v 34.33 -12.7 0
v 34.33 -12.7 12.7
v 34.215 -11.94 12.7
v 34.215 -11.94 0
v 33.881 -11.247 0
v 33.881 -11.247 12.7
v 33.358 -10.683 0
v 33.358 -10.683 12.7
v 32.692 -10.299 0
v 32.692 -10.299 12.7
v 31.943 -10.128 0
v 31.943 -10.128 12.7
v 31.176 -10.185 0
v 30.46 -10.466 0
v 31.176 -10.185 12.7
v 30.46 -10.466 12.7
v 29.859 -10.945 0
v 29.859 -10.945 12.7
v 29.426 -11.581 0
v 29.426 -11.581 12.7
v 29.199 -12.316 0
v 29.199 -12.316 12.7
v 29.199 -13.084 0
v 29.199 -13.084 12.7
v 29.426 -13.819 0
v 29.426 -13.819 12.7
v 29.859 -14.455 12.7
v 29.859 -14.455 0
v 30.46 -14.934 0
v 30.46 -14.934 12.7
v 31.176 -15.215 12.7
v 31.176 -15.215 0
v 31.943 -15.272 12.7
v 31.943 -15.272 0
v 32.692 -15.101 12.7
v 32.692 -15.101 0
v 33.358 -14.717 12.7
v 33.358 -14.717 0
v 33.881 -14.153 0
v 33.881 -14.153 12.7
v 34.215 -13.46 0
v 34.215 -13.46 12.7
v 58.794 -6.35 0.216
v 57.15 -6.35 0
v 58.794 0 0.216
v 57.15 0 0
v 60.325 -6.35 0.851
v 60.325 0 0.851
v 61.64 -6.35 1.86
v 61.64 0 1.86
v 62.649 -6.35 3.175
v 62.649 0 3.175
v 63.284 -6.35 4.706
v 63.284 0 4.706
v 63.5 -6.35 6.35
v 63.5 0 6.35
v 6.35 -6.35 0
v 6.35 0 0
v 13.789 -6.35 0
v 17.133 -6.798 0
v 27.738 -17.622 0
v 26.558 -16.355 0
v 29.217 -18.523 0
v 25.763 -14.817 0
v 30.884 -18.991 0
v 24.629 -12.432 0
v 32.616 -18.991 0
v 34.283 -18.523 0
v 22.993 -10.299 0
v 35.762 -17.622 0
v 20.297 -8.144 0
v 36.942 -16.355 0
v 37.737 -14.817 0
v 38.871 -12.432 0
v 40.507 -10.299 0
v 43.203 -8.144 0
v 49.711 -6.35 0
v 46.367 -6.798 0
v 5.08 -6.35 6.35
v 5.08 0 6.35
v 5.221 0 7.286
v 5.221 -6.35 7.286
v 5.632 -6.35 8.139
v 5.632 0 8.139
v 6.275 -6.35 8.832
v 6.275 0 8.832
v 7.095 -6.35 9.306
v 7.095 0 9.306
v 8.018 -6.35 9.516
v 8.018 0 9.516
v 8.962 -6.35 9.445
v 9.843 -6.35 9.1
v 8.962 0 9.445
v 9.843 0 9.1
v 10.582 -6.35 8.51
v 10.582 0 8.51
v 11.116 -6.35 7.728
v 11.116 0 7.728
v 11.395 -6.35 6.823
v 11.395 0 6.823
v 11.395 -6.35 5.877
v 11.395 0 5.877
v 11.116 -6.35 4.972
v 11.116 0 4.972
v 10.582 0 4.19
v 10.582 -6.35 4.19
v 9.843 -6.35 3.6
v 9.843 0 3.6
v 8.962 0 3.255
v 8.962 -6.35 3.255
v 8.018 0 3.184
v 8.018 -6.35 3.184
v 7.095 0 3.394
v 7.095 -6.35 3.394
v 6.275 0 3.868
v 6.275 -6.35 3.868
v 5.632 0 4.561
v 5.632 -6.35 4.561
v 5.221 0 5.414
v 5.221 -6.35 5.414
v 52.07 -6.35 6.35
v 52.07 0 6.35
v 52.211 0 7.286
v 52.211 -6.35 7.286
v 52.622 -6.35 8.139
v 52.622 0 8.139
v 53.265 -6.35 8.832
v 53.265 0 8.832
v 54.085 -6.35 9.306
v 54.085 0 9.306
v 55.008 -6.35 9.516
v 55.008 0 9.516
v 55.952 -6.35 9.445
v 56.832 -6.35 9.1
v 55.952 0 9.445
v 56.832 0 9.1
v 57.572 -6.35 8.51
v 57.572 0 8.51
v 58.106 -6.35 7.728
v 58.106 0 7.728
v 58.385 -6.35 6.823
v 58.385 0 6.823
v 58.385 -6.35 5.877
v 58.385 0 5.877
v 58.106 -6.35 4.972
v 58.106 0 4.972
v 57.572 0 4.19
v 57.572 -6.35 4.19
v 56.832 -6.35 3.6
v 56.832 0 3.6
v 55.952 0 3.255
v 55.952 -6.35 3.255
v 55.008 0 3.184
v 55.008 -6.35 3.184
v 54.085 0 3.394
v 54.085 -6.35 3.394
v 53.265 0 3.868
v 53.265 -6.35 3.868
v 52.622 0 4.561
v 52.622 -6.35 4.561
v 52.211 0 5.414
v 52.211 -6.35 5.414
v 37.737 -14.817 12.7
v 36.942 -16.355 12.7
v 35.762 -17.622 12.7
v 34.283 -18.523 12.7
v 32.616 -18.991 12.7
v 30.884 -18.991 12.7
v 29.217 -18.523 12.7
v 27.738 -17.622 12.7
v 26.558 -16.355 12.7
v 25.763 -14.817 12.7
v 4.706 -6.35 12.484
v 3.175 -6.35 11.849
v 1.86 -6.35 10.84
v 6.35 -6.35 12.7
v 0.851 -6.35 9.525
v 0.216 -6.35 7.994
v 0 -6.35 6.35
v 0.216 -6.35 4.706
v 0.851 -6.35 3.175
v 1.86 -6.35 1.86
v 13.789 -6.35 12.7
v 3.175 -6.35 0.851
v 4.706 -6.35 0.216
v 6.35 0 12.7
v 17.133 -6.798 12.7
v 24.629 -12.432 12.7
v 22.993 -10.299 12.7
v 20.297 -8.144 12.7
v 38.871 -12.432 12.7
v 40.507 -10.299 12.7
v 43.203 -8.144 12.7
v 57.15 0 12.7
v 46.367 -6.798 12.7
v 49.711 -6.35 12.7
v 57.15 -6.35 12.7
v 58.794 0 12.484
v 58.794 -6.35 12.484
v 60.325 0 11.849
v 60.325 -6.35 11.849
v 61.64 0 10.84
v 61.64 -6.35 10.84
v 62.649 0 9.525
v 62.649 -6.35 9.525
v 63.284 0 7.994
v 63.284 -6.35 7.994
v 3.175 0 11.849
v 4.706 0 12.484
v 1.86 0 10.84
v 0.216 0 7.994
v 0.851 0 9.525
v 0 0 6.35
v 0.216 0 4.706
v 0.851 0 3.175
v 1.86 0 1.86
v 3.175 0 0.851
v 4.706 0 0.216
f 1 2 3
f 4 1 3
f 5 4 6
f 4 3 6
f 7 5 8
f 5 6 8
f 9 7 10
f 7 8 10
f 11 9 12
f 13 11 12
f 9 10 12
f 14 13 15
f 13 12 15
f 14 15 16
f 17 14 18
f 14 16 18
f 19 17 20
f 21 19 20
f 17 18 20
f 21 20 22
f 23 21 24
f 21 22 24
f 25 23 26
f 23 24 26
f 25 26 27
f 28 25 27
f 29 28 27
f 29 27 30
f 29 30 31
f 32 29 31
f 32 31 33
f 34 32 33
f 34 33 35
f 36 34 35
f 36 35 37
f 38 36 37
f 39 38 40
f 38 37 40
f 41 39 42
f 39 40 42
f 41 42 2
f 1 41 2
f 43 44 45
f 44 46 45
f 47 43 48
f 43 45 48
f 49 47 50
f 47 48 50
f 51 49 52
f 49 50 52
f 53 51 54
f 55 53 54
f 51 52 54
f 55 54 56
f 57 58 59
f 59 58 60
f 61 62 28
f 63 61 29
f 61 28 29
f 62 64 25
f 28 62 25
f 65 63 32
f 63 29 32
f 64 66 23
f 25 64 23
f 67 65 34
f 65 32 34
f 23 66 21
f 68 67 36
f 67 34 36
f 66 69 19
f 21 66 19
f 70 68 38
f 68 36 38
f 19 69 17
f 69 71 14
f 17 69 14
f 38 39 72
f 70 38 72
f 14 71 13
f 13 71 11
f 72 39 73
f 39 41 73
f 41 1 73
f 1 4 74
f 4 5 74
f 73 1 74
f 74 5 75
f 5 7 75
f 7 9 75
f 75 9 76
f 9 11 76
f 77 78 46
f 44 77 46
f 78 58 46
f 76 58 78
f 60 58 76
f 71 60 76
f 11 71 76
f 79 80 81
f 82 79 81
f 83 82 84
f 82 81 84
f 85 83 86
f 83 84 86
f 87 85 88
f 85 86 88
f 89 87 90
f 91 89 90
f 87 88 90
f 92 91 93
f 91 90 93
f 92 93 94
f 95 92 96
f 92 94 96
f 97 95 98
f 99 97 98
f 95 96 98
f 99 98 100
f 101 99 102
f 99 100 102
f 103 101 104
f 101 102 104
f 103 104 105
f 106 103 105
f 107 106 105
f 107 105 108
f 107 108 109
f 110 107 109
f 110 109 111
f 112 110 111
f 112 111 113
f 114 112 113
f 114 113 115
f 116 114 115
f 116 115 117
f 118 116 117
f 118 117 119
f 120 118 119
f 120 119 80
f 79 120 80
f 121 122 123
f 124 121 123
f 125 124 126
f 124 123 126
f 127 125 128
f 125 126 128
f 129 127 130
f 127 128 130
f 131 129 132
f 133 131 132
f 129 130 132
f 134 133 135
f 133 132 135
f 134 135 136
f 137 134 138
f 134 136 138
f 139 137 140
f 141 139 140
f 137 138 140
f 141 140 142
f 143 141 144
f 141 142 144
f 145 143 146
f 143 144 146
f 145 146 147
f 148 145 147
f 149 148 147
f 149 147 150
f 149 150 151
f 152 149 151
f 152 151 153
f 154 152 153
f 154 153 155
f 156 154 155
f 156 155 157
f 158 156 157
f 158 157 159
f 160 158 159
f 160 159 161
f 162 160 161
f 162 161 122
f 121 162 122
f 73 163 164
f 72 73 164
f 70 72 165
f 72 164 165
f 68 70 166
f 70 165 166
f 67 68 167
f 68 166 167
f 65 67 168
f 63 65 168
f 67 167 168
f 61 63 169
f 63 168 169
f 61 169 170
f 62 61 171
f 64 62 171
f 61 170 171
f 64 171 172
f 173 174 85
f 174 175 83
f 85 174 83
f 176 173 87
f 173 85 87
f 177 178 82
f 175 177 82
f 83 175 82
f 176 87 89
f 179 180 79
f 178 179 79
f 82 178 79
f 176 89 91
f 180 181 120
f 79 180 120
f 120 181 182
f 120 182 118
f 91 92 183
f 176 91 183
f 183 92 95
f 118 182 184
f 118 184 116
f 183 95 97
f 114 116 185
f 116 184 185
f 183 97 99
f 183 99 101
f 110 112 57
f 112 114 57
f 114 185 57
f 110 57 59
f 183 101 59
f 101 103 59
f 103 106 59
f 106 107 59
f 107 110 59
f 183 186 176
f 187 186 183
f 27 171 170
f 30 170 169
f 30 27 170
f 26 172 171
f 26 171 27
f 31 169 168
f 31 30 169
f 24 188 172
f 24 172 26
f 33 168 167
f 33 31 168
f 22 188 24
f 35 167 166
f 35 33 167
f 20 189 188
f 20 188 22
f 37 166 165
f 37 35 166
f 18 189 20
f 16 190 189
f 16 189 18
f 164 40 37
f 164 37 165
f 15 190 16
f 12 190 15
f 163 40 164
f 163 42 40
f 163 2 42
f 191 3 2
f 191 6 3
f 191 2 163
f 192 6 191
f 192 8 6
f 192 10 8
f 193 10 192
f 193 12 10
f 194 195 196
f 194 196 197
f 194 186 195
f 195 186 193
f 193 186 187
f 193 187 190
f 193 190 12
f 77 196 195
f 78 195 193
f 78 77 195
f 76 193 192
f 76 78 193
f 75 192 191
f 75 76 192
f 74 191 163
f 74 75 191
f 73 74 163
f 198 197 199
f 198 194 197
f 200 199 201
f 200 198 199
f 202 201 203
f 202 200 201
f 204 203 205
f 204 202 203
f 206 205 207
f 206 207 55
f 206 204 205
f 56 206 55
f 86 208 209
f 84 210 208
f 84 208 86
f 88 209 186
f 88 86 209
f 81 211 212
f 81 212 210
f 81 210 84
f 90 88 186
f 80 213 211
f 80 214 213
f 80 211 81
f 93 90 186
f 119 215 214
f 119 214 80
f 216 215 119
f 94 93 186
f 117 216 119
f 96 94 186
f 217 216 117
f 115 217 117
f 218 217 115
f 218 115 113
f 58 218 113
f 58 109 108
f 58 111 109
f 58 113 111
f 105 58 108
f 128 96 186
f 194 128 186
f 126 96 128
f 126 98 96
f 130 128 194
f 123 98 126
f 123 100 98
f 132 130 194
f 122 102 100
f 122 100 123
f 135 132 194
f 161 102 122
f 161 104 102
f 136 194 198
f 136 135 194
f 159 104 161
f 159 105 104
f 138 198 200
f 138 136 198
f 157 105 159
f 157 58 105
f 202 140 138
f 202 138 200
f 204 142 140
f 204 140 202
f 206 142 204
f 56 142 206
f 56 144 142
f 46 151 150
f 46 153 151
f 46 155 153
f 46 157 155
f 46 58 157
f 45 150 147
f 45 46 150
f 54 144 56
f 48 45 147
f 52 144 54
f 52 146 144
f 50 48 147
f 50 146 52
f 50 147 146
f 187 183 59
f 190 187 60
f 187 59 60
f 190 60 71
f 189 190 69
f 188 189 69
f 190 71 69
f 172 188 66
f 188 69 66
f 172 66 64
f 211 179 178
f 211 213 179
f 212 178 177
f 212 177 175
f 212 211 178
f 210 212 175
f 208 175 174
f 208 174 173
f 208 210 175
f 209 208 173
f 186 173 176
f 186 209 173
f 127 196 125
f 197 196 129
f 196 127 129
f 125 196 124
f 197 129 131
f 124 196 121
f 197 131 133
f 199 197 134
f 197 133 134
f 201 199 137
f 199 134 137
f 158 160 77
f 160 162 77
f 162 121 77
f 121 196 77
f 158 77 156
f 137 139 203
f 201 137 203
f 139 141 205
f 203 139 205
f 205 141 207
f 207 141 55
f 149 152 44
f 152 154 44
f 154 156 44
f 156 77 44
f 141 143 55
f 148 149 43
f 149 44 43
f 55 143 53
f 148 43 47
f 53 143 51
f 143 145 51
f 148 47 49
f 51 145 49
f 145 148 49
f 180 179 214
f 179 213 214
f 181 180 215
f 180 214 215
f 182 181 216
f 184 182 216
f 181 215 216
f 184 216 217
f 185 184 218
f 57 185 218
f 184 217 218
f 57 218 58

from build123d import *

# Parameters (mm, degrees)
SKETCH1_W           = 63.5
SKETCH1_H           = 6.35
BOSS_EXTRUDE1_DEPTH = 12.7
SKETCH2_R           = 3.175
CUT_EXTRUDE1_DEPTH  = 26.162
FILLET1_R           = 6.35
SKETCH3_R           = 2.5796875
BOSS_EXTRUDE2_DEPTH = 12.7
FILLET2_R           = 12.7


with BuildPart() as part:
    # Sketch1 → Boss-Extrude1 (new body)
    with BuildSketch(Plane.XY):
        with Locations((31.75, -3.175)):
            Rectangle(SKETCH1_W, SKETCH1_H)
    extrude(amount=BOSS_EXTRUDE1_DEPTH)

    # Sketch2 → Cut-Extrude1 (cut)
    with BuildSketch(Plane(origin=(0, 0, 0), x_dir=(1, 0, 0), z_dir=(0, 1, 0))):
        with Locations(Location((8.255, -6.35, 0), (0, 0, 180))):
            Circle(SKETCH2_R)
        with Locations(Location((55.245, -6.35, 0), (0, 0, 180))):
            Circle(SKETCH2_R)
    extrude(amount=-CUT_EXTRUDE1_DEPTH, mode=Mode.SUBTRACT)

    # Fillet1
    fillet1_edges = [part.edges().sort_by_distance(p)[0] for p in [
        (63.5, -3.175, 12.7),
        (63.5, -3.175, 0),
        (0, -3.175, 0),
        (0, -3.175, 12.7),
    ]]
    fillet(fillet1_edges, radius=FILLET1_R - 0.0001)  # a hair under: the kernel refuses the full size

    # Sketch3 → Boss-Extrude2 (add)
    with BuildSketch(Plane.XY.offset(12.7)):
        with BuildLine():
            Line((25.4, -6.35), (38.1, -6.35))
            Line((38.1, -6.35), (38.1, -12.7))
            ThreePointArc((38.1, -12.7), (31.75, -19.05), (25.4, -12.7))
            Line((25.4, -12.7), (25.4, -6.35))
        make_face()
        with Locations((31.75, -12.7)):
            Circle(SKETCH3_R, mode=Mode.SUBTRACT)
    extrude(amount=-BOSS_EXTRUDE2_DEPTH)

    # Fillet2
    fillet2_edges = [part.edges().sort_by_distance(p)[0] for p in [
        (38.1, -6.35, 6.35),
        (25.4, -6.35, 6.35),
    ]]
    fillet(fillet2_edges, radius=FILLET2_R)


solid = part.part
